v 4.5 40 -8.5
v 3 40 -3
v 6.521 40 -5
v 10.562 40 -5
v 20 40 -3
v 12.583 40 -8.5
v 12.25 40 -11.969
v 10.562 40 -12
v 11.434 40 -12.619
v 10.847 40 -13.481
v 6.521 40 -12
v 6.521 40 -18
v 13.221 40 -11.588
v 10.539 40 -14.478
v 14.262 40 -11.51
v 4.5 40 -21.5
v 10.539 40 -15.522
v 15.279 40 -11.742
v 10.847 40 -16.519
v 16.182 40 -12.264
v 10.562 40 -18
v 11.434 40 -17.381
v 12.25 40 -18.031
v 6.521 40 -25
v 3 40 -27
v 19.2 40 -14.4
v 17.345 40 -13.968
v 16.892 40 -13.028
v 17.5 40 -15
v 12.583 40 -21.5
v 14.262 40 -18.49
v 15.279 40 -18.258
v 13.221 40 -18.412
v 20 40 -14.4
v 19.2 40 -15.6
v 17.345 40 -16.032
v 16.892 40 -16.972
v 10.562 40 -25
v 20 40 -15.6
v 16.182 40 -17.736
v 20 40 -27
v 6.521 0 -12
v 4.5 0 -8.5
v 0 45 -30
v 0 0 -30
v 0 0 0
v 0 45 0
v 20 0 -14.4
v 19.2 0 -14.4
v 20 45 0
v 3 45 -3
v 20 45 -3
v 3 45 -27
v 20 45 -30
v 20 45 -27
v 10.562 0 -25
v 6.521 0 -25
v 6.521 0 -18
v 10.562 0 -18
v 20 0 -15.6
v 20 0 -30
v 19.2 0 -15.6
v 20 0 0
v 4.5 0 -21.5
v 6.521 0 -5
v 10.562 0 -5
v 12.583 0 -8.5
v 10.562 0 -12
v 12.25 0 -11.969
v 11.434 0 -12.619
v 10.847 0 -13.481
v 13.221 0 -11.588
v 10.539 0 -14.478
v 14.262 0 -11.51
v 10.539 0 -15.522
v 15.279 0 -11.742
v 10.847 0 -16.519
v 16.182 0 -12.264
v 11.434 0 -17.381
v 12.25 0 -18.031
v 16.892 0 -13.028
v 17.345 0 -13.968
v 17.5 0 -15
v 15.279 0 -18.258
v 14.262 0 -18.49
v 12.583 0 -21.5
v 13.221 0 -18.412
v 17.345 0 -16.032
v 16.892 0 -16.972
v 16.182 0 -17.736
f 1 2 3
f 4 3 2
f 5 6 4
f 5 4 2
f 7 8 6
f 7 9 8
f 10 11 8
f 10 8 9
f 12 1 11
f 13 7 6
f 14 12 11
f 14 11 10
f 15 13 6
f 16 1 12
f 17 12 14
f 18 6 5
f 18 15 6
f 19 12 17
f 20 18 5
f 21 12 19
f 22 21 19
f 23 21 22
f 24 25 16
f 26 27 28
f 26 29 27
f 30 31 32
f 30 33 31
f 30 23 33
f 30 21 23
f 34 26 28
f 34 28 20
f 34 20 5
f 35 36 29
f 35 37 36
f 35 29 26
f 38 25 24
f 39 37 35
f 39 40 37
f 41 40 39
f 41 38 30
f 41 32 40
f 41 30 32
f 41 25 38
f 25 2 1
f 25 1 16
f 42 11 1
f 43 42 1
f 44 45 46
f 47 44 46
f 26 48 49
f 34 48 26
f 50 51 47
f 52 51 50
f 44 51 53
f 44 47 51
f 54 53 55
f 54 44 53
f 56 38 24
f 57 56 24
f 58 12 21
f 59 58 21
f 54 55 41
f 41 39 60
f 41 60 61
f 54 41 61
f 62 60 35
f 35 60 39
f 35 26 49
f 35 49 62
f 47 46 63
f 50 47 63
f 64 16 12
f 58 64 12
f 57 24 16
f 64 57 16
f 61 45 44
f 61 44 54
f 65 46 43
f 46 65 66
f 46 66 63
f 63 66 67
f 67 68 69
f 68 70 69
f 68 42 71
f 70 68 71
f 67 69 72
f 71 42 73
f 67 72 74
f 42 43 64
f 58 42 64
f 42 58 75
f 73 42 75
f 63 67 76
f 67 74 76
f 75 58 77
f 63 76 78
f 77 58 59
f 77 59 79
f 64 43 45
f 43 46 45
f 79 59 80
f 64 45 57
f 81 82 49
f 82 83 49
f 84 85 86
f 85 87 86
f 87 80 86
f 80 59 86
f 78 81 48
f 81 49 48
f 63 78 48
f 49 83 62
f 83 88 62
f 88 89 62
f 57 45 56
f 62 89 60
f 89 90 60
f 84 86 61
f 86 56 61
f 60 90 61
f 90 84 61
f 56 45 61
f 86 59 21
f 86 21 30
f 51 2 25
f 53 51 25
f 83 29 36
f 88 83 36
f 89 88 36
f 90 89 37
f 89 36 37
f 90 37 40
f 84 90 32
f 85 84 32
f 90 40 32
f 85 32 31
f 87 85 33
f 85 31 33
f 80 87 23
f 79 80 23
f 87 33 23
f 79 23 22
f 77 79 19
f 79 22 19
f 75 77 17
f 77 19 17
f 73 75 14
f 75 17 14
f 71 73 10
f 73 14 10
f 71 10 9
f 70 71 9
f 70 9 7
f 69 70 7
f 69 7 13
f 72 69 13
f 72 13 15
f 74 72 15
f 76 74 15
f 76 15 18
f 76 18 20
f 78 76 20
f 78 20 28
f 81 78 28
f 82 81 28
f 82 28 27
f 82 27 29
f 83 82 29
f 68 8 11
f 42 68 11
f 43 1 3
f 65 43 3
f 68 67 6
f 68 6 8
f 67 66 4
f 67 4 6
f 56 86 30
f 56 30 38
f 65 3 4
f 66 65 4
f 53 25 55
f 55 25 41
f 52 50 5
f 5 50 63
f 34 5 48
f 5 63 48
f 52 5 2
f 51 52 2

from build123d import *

# Parameters (mm, degrees)
SKETCH1_W           = 20
SKETCH1_H           = 30
BOSS_EXTRUDE1_DEPTH = 40
BOSS_EXTRUDE2_DEPTH = 5
SKETCH3_R           = 3.5
CUT_EXTRUDE1_DEPTH  = 41
SKETCH4_W           = 1.2
SKETCH4_H           = 40
CUT_EXTRUDE2_DEPTH  = 0.8


with BuildPart() as part:
    # Sketch1 → Boss-Extrude1 (new body)
    with BuildSketch(Plane(origin=(0, 0, 0), x_dir=(1, 0, 0), z_dir=(0, 1, 0))):
        with Locations((10, 15)):
            Rectangle(SKETCH1_W, SKETCH1_H)
    extrude(amount=BOSS_EXTRUDE1_DEPTH)

    # Sketch2 → Boss-Extrude2 (add)
    with BuildSketch(Plane(origin=(0, 40, 0), x_dir=(1, 0, 0), z_dir=(0, 1, 0))):
        Polygon((20, 0), (20, 3), (3, 3), (3, 27), (20, 27), (20, 30), (0, 30), (0, 0), align=None)
    extrude(amount=BOSS_EXTRUDE2_DEPTH)

    # Sketch3 → Cut-Extrude1 (cut, through all)
    with BuildSketch(Plane(origin=(0, 40, 0), x_dir=(1, 0, 0), z_dir=(0, 1, 0))):
        with Locations((14, 15)):
            Circle(SKETCH3_R)
        Polygon((12.582903769, 8.5), (10.562177826, 12), (6.520725942, 12), (4.5, 8.5), (6.520725942, 5), (10.562177826, 5), align=None)
        Polygon((12.582903769, 21.5), (10.562177826, 25), (6.520725942, 25), (4.5, 21.5), (6.520725942, 18), (10.562177826, 18), align=None)
    extrude(amount=-CUT_EXTRUDE1_DEPTH, mode=Mode.SUBTRACT)

    # Sketch4 → Cut-Extrude2 (cut)
    with BuildSketch(Plane(origin=(20, 0, 0), x_dir=(0, 0, -1), z_dir=(1, 0, 0))):
        with Locations((15, 20)):
            Rectangle(SKETCH4_W, SKETCH4_H)
    extrude(amount=-CUT_EXTRUDE2_DEPTH, mode=Mode.SUBTRACT)


solid = part.part
